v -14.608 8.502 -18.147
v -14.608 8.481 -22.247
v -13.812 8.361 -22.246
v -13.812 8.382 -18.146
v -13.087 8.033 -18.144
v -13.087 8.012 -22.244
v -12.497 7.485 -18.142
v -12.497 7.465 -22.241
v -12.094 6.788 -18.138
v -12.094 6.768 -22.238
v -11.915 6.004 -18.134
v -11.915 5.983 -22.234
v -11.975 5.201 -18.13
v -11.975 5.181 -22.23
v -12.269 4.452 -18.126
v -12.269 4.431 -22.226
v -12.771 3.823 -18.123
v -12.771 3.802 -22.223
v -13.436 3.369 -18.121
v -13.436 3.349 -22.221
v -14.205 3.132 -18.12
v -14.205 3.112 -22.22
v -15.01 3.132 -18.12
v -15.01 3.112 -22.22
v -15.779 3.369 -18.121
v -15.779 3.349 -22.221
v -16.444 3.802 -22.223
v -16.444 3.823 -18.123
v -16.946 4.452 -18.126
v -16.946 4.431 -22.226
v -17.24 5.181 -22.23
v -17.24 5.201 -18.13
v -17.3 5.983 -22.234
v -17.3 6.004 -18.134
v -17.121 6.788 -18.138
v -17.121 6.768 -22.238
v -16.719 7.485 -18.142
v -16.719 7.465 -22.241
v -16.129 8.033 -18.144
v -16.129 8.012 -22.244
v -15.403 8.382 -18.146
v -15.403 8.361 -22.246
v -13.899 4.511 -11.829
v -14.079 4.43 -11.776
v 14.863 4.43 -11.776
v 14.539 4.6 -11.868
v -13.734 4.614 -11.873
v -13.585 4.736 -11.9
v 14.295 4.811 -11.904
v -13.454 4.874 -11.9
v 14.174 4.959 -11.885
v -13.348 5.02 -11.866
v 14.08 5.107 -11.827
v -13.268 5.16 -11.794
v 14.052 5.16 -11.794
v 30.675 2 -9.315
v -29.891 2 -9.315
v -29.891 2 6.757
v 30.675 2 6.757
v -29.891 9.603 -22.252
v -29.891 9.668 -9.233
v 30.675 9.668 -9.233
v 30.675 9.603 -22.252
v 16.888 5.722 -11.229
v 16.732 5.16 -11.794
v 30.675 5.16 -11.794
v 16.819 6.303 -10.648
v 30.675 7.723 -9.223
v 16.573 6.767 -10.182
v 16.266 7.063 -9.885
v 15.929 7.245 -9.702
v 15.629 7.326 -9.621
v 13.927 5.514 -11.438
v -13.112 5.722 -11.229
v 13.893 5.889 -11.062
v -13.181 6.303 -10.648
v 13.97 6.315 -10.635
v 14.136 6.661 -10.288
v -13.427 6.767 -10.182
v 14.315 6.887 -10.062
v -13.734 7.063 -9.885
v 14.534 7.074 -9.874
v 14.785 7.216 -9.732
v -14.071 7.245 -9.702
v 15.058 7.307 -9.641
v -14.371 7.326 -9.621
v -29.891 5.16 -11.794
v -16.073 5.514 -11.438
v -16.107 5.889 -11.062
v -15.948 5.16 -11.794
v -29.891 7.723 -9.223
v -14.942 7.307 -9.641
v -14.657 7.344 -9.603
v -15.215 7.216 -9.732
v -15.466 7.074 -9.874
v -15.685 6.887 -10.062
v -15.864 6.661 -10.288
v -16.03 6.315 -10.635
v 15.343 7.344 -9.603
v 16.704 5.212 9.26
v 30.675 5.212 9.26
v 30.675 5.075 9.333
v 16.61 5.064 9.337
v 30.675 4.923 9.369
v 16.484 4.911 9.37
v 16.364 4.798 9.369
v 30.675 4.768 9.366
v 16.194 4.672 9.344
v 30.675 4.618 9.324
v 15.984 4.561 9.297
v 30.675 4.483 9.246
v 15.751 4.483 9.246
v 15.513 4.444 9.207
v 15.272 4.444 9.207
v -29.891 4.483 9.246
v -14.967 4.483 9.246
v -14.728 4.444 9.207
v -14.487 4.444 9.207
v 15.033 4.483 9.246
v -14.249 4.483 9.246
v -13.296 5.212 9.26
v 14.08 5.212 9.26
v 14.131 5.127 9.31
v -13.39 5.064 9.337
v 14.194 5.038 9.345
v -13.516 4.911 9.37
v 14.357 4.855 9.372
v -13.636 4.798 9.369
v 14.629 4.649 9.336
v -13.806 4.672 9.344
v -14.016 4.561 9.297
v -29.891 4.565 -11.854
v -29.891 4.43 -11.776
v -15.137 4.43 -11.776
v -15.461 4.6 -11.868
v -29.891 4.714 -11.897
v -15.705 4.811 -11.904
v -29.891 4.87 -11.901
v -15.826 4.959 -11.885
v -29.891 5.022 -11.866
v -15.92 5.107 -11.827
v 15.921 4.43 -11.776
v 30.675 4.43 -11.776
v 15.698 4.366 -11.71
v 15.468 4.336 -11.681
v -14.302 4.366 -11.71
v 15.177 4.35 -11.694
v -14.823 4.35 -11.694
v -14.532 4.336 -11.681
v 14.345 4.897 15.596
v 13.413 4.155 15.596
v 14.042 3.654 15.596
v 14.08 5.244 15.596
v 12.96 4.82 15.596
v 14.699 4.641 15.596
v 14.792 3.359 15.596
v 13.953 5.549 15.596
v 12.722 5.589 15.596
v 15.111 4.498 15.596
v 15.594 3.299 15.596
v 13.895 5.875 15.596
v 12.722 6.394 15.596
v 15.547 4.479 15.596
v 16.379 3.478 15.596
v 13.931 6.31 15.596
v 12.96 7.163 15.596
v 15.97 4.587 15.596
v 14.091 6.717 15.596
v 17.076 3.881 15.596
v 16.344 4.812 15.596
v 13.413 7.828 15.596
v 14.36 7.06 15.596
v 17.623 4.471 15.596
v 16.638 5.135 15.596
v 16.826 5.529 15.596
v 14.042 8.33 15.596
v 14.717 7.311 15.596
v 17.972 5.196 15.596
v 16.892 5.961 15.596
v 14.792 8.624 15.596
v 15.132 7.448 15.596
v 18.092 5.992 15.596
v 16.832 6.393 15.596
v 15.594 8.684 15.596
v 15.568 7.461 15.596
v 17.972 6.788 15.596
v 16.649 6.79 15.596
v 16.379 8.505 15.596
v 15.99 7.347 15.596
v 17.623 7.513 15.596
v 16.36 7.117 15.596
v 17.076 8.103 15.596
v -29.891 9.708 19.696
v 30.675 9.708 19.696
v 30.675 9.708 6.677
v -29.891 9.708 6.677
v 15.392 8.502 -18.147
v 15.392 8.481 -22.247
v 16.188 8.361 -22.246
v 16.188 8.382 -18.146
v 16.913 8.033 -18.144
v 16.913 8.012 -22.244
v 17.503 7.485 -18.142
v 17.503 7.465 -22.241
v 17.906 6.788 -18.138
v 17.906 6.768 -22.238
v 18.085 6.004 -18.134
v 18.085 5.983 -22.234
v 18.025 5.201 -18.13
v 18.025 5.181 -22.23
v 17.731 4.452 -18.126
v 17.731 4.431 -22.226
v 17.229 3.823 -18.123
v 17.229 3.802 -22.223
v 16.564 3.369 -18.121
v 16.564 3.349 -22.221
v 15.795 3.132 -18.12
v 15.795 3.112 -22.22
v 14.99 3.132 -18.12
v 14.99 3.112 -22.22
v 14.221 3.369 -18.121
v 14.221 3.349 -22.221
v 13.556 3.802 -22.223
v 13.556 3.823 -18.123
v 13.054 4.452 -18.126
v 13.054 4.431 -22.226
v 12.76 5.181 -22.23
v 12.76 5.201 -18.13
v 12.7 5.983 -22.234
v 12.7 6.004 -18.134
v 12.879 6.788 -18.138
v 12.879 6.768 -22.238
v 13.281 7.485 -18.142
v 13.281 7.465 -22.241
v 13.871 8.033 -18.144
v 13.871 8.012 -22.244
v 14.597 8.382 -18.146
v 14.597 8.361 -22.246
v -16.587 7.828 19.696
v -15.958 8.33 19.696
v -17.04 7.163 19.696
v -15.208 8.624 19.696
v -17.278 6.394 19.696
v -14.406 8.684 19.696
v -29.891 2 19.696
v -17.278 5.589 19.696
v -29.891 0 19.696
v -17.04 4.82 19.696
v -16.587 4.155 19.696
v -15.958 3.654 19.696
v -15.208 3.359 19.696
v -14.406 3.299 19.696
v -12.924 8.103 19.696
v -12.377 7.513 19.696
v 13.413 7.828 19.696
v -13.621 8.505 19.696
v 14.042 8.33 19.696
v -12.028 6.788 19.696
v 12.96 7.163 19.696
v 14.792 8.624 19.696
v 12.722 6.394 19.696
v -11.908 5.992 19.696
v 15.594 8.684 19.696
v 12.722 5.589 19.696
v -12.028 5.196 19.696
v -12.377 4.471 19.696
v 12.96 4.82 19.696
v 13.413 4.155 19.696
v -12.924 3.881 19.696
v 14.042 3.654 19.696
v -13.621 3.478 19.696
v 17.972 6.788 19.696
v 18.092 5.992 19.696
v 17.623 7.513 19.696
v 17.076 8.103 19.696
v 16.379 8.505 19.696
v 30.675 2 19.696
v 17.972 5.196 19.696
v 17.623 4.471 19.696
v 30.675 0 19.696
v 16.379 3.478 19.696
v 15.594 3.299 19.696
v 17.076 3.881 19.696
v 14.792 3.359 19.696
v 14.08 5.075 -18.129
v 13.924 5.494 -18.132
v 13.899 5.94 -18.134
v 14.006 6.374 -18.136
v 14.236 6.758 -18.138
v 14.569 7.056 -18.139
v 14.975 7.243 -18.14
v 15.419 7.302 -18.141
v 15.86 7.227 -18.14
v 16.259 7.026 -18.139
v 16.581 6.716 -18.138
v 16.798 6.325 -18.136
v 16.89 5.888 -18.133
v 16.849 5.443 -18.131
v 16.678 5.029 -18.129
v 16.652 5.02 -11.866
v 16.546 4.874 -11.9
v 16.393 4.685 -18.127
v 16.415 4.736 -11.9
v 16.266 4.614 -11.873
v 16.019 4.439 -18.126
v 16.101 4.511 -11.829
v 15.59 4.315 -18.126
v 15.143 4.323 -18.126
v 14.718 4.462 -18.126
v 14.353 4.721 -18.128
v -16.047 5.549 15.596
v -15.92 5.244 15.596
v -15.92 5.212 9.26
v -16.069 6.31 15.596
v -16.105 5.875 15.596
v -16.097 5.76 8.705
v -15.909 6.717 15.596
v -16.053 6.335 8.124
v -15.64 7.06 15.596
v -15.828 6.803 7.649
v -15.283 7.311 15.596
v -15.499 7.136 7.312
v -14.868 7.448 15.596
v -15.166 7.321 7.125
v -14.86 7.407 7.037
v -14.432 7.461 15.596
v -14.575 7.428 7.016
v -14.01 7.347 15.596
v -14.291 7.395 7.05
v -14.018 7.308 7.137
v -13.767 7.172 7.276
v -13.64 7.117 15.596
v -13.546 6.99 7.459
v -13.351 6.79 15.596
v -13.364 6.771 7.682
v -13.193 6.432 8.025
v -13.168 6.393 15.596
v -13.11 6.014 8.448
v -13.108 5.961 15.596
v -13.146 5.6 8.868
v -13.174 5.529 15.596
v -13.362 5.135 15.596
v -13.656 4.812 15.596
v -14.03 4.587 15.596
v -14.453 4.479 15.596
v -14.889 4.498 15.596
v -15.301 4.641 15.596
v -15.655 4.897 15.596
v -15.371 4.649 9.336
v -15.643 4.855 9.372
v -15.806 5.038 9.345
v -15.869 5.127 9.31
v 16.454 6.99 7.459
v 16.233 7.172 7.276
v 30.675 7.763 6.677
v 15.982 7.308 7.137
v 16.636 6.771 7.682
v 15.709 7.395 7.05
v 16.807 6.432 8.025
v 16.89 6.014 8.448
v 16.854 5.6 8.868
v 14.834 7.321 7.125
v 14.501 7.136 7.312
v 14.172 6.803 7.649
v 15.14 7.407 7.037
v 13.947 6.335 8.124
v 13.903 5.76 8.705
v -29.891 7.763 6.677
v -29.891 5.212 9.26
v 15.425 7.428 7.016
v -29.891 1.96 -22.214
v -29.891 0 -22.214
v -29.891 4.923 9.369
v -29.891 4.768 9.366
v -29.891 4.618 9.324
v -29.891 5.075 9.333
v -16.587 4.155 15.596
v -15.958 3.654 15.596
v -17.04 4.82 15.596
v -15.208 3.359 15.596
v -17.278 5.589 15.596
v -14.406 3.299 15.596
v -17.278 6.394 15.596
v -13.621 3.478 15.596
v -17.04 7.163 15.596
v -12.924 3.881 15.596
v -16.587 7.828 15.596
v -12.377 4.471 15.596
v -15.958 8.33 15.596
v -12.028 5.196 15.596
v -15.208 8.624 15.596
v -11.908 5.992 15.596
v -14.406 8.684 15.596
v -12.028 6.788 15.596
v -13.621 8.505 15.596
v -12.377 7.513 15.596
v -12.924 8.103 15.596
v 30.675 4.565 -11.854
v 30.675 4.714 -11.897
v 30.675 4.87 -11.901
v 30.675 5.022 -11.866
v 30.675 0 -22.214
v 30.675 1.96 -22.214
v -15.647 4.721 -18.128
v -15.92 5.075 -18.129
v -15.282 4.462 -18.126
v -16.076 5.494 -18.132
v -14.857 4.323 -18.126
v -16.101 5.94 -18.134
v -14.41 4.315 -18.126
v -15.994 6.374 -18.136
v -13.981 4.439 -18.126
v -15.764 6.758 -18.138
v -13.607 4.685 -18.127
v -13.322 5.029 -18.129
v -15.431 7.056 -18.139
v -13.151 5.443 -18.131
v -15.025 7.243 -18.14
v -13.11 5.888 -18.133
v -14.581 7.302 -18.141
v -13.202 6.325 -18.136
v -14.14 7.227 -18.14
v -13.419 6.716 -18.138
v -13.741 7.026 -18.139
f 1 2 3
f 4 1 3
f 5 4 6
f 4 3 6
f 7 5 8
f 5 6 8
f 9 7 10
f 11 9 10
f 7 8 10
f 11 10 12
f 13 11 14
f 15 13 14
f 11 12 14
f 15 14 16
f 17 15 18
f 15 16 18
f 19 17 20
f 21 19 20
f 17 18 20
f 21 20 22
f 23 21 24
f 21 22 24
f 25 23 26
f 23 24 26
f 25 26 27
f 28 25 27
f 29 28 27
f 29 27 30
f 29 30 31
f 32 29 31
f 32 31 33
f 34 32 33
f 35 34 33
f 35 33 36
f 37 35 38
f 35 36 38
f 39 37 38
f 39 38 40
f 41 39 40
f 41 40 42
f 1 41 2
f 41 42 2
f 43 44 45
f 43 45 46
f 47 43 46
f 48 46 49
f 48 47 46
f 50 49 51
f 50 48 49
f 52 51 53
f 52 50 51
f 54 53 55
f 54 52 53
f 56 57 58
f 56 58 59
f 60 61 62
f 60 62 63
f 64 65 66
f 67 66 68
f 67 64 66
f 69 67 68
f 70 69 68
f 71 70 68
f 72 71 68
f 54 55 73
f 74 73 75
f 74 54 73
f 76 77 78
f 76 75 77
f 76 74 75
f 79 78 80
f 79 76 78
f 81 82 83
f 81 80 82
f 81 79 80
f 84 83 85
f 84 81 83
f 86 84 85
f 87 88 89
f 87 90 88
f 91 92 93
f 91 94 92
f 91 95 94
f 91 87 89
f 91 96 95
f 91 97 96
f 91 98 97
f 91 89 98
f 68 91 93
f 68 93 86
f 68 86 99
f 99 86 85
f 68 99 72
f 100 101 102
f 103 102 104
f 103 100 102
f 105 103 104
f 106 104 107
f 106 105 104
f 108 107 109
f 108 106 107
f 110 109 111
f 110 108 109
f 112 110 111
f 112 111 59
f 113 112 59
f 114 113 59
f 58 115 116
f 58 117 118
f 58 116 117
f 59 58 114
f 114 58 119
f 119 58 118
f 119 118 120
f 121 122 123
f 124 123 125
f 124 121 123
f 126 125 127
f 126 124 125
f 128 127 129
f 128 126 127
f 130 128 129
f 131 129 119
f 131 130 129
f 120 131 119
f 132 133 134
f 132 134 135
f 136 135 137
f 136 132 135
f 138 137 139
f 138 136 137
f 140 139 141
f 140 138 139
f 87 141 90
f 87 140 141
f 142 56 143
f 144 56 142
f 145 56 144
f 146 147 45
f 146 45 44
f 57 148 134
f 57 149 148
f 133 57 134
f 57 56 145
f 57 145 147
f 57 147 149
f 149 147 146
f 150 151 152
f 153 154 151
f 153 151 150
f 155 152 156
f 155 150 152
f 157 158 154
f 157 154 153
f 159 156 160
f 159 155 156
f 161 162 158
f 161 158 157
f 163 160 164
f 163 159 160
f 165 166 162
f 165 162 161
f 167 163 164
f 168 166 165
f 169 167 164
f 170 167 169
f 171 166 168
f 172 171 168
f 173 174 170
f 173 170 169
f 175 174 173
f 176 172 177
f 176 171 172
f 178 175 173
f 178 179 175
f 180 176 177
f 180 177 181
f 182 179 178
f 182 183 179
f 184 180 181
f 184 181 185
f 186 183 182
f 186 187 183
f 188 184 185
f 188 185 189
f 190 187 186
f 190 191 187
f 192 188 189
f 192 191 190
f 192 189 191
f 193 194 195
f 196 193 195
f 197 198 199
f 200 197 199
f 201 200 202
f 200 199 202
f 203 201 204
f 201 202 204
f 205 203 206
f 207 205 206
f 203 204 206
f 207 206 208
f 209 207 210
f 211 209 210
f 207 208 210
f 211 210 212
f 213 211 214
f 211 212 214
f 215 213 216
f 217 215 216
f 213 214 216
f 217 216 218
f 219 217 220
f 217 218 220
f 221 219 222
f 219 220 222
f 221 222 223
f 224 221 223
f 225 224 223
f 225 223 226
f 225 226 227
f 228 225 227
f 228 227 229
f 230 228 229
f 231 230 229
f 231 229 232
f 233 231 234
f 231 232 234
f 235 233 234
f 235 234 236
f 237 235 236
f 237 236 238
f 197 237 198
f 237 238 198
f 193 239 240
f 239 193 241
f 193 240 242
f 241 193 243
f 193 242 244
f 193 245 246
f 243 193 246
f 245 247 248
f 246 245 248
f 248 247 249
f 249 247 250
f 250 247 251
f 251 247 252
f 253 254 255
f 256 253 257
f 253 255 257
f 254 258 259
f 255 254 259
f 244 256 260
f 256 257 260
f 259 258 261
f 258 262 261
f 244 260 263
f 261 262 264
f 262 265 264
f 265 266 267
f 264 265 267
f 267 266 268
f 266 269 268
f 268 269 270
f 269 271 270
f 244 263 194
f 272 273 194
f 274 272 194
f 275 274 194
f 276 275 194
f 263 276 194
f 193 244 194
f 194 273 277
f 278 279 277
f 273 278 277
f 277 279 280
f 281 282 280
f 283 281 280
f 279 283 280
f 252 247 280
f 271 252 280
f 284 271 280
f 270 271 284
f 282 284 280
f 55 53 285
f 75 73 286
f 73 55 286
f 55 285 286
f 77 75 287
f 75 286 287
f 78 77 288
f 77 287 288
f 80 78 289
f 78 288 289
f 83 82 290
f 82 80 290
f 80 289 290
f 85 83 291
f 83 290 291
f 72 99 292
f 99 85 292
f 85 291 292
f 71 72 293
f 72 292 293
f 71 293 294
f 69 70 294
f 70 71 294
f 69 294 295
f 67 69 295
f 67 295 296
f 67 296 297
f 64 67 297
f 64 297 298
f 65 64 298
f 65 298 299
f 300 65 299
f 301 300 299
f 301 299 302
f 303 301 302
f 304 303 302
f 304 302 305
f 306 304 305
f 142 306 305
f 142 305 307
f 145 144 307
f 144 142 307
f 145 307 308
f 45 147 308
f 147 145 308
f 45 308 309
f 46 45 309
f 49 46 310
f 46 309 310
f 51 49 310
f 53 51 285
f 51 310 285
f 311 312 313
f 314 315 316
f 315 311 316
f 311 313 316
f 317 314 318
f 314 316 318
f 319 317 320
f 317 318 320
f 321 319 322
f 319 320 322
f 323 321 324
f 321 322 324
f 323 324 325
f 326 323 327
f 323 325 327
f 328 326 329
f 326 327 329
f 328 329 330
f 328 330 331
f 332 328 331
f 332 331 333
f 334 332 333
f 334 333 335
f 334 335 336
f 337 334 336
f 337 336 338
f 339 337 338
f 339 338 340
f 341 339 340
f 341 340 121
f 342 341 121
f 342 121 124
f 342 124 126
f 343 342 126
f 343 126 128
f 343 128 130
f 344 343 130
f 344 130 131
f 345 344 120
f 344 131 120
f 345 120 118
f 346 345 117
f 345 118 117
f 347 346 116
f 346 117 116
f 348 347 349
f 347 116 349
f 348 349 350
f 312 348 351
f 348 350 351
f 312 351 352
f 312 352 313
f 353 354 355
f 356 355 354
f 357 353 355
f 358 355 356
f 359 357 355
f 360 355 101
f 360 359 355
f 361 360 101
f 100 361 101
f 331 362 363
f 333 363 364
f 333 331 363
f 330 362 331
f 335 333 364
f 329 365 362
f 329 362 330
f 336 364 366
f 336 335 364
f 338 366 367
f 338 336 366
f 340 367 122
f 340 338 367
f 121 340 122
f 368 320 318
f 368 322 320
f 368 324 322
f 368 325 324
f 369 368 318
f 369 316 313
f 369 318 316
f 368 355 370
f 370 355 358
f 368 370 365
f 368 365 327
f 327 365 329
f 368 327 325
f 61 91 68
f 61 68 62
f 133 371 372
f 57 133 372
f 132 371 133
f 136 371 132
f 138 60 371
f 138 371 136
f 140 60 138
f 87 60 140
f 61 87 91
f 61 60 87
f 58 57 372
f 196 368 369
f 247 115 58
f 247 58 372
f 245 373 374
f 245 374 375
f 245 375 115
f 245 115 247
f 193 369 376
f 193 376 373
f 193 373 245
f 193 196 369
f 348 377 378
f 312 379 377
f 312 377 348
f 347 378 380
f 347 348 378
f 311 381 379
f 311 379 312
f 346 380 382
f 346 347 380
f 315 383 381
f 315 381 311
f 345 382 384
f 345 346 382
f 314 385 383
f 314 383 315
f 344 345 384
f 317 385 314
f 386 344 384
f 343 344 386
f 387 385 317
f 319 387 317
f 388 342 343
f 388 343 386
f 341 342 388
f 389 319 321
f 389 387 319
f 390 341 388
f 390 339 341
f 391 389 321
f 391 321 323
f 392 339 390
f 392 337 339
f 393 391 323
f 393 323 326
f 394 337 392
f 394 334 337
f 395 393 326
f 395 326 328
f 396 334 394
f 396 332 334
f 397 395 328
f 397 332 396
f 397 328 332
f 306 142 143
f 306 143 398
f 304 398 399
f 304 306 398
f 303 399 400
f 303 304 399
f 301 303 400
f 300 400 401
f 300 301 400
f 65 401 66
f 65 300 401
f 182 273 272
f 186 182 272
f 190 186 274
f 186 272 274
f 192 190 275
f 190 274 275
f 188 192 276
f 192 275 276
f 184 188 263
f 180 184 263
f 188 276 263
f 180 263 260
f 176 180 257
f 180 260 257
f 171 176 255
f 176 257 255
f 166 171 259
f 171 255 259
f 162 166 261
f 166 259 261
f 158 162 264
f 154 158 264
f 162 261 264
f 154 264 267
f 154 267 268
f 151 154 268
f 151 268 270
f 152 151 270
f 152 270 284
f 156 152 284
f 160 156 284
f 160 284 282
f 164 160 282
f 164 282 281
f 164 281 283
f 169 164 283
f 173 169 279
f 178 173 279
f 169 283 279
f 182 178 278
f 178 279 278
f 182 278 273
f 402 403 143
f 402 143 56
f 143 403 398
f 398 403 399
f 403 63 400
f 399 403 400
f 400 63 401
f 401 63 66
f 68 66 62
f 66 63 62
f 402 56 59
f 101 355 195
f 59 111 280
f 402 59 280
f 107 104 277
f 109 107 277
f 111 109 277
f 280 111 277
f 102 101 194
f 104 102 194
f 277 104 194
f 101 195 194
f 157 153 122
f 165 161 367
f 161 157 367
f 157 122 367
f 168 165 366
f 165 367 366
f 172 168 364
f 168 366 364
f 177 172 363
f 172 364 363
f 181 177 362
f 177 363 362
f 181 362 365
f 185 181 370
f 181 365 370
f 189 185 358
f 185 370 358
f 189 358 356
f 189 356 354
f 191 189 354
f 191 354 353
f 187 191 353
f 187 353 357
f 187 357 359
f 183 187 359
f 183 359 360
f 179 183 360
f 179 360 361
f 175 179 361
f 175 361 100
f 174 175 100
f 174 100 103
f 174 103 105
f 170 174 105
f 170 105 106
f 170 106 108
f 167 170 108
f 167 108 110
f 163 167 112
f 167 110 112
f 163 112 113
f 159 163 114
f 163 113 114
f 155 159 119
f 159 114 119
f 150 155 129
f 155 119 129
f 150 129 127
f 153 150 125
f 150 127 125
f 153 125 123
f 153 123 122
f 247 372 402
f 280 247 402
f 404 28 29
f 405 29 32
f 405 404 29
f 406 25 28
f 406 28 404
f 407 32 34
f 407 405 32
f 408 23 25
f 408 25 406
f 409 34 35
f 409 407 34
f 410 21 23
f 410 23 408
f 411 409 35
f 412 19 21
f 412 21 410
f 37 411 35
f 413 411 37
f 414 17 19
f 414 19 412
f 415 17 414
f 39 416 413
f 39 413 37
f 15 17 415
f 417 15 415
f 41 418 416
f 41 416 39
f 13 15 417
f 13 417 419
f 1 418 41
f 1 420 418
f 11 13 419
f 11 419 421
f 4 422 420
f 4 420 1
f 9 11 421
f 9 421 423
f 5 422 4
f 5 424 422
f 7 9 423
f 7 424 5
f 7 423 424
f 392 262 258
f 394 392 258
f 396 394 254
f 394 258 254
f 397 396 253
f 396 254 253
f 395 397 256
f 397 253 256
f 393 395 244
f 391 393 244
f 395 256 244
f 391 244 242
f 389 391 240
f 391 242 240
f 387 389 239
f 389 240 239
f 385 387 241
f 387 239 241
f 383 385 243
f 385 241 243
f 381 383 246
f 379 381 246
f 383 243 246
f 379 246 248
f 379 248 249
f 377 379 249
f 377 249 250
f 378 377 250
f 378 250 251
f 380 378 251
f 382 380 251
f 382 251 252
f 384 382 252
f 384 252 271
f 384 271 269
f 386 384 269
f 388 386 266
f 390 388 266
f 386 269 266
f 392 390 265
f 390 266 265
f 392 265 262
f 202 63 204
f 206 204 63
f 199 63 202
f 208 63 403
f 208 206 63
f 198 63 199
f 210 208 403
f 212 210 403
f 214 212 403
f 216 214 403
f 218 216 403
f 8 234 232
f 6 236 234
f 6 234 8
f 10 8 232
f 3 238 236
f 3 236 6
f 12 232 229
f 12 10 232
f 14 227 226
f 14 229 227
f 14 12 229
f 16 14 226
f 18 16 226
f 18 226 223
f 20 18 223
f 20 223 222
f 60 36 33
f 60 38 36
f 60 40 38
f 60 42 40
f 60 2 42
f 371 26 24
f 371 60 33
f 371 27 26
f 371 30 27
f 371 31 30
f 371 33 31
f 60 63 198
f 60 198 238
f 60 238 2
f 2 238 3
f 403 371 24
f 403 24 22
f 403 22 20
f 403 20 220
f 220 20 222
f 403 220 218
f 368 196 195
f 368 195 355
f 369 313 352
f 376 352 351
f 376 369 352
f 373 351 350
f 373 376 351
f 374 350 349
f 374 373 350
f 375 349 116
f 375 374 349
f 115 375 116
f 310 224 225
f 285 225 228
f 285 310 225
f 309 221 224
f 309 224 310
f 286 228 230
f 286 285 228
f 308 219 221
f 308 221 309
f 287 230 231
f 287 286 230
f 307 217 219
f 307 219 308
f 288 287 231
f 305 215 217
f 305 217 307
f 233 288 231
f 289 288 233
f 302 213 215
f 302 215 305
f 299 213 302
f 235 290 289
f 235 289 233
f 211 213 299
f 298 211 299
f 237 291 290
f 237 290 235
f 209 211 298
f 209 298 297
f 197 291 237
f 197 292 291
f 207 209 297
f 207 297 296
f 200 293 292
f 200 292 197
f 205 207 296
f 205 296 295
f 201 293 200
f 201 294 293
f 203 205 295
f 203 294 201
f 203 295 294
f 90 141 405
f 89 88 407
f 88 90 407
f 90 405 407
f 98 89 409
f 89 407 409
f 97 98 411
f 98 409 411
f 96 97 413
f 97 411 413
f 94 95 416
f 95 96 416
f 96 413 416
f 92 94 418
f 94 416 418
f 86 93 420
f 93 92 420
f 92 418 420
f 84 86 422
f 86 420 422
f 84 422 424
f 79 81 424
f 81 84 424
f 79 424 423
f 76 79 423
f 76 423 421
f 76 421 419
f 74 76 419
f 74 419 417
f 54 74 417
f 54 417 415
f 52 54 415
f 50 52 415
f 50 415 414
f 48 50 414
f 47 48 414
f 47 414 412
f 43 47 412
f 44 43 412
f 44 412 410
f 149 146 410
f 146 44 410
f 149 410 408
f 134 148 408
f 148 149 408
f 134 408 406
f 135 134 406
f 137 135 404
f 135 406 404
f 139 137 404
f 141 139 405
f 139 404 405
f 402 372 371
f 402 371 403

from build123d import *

# Parameters (mm, degrees)
SKETCH1_W           = 60.566280351
SKETCH1_H           = 41.91
BOSS_EXTRUDE1_DEPTH = 2
BOSS_EXTRUDE2_DEPTH = 60.56628035
CUT_EXTRUDE1_REACH  = 54.849
SKETCH5_R           = 1.5
SKETCH6_R           = 2.7
CUT_EXTRUDE2_DEPTH  = 4.1
SKETCH9_R           = 2.7
CUT_EXTRUDE3_DEPTH  = 4.1


with BuildPart() as part:
    # Sketch1 → Boss-Extrude1 (new body)
    with BuildSketch(Plane(origin=(0, 0, 0), x_dir=(1, 0, 0), z_dir=(0, 1, 0))):
        with Locations((0.392342893, 1.258772873)):
            Rectangle(SKETCH1_W, SKETCH1_H)
    extrude(amount=BOSS_EXTRUDE1_DEPTH)

    # Sketch4 → Boss-Extrude2 (add)
    with BuildSketch(Plane.ZY.offset(29.890797283)):
        with BuildLine():
            Line((-22.21383483, 1.959789744), (-9.274266868, 1.959789744))
            Line((-9.274266868, 1.959789744), (-11.775730551, 4.430225514))
            ThreePointArc((-11.775730551, 4.430225514), (-11.903861669, 4.791947782), (-11.793775933, 5.15956404))
            Line((-11.793775933, 5.15956404), (-9.222914706, 7.723241684))
            Line((-9.222914706, 7.723241684), (-9.232672854, 9.668426415))
            Line((-9.232672854, 9.668426415), (-22.252178068, 9.603113205))
            Line((-22.252178068, 9.603113205), (-22.21383483, 1.959789744))
        make_face()
        with BuildLine():
            Line((6.756821981, 2), (19.696227127, 2))
            Line((19.696227127, 2), (19.696227127, 9.708331019))
            Line((19.696227127, 9.708331019), (6.676558091, 9.708331019))
            Line((6.676558091, 9.708331019), (6.676558091, 7.763121812))
            Line((6.676558091, 7.763121812), (9.260247666, 5.212373159))
            ThreePointArc((9.260247666, 5.212373159), (9.372176165, 4.845313772), (9.24586124, 4.482953285))
            Line((9.24586124, 4.482953285), (6.756821981, 2))
        make_face()
    extrude(amount=-BOSS_EXTRUDE2_DEPTH)

    # Cut-Extrude1: up to this plane
    cut_extrude1_end = Plane(origin=(-29.890797283, 2, 19.696227127), z_dir=(0, 0, -1))
    # Sketch5 → Cut-Extrude1 (cut, up to the surface)
    with BuildSketch(Plane(origin=(0, -0.111385049, -22.203444644), x_dir=(-1, 0, 0), z_dir=(0, -0.005016503049651579, -0.9999874172694139)), mode=Mode.PRIVATE) as cut_extrude1_sk1:
        with Locations(Location((14.607657107, 5.892910673, 0), (0, 0, 331.006868197))):
            Circle(SKETCH5_R)
    cut_extrude1_tool1 = split(extrude(cut_extrude1_sk1.sketch, amount=-CUT_EXTRUDE1_REACH, mode=Mode.PRIVATE), bisect_by=cut_extrude1_end, keep=Keep.BOTH, mode=Mode.PRIVATE)
    add(cut_extrude1_tool1.solids().sort_by_distance((-14.607657, 5.781451, -22.233006))[0], mode=Mode.SUBTRACT)
    # Sketch5 → Cut-Extrude1 (cut, up to the surface)
    with BuildSketch(Plane(origin=(0, -0.111385049, -22.203444644), x_dir=(-1, 0, 0), z_dir=(0, -0.005016503049651579, -0.9999874172694139)), mode=Mode.PRIVATE) as cut_extrude1_sk2:
        with Locations(Location((-15.392342893, 5.892910673, 0), (0, 0, 331.006868197))):
            Circle(SKETCH5_R)
    cut_extrude1_tool2 = split(extrude(cut_extrude1_sk2.sketch, amount=-CUT_EXTRUDE1_REACH, mode=Mode.PRIVATE), bisect_by=cut_extrude1_end, keep=Keep.BOTH, mode=Mode.PRIVATE)
    add(cut_extrude1_tool2.solids().sort_by_distance((15.392343, 5.781451, -22.233006))[0], mode=Mode.SUBTRACT)

    # Sketch6 → Cut-Extrude2 (cut)
    with BuildSketch(Plane(origin=(0, -0.111385049, -22.203444644), x_dir=(-1, 0, 0), z_dir=(0, -0.005016503049651579, -0.9999874172694139))):
        with Locations(Location((14.607657107, 5.892910673, 0), (0, 0, 90))):
            Circle(SKETCH6_R)
        with Locations(Location((-15.392342893, 5.892910673, 0), (0, 0, 90))):
            Circle(SKETCH6_R)
    extrude(amount=-CUT_EXTRUDE2_DEPTH, mode=Mode.SUBTRACT)

    # Sketch9 → Cut-Extrude3 (cut)
    with BuildSketch(Plane.XY.offset(19.696227127)):
        with Locations((15.392342893, 5.991792249)):
            Circle(SKETCH9_R)
        with Locations((-14.607657107, 5.991792249)):
            Circle(SKETCH9_R)
    extrude(amount=-CUT_EXTRUDE3_DEPTH, mode=Mode.SUBTRACT)


solid = part.part
